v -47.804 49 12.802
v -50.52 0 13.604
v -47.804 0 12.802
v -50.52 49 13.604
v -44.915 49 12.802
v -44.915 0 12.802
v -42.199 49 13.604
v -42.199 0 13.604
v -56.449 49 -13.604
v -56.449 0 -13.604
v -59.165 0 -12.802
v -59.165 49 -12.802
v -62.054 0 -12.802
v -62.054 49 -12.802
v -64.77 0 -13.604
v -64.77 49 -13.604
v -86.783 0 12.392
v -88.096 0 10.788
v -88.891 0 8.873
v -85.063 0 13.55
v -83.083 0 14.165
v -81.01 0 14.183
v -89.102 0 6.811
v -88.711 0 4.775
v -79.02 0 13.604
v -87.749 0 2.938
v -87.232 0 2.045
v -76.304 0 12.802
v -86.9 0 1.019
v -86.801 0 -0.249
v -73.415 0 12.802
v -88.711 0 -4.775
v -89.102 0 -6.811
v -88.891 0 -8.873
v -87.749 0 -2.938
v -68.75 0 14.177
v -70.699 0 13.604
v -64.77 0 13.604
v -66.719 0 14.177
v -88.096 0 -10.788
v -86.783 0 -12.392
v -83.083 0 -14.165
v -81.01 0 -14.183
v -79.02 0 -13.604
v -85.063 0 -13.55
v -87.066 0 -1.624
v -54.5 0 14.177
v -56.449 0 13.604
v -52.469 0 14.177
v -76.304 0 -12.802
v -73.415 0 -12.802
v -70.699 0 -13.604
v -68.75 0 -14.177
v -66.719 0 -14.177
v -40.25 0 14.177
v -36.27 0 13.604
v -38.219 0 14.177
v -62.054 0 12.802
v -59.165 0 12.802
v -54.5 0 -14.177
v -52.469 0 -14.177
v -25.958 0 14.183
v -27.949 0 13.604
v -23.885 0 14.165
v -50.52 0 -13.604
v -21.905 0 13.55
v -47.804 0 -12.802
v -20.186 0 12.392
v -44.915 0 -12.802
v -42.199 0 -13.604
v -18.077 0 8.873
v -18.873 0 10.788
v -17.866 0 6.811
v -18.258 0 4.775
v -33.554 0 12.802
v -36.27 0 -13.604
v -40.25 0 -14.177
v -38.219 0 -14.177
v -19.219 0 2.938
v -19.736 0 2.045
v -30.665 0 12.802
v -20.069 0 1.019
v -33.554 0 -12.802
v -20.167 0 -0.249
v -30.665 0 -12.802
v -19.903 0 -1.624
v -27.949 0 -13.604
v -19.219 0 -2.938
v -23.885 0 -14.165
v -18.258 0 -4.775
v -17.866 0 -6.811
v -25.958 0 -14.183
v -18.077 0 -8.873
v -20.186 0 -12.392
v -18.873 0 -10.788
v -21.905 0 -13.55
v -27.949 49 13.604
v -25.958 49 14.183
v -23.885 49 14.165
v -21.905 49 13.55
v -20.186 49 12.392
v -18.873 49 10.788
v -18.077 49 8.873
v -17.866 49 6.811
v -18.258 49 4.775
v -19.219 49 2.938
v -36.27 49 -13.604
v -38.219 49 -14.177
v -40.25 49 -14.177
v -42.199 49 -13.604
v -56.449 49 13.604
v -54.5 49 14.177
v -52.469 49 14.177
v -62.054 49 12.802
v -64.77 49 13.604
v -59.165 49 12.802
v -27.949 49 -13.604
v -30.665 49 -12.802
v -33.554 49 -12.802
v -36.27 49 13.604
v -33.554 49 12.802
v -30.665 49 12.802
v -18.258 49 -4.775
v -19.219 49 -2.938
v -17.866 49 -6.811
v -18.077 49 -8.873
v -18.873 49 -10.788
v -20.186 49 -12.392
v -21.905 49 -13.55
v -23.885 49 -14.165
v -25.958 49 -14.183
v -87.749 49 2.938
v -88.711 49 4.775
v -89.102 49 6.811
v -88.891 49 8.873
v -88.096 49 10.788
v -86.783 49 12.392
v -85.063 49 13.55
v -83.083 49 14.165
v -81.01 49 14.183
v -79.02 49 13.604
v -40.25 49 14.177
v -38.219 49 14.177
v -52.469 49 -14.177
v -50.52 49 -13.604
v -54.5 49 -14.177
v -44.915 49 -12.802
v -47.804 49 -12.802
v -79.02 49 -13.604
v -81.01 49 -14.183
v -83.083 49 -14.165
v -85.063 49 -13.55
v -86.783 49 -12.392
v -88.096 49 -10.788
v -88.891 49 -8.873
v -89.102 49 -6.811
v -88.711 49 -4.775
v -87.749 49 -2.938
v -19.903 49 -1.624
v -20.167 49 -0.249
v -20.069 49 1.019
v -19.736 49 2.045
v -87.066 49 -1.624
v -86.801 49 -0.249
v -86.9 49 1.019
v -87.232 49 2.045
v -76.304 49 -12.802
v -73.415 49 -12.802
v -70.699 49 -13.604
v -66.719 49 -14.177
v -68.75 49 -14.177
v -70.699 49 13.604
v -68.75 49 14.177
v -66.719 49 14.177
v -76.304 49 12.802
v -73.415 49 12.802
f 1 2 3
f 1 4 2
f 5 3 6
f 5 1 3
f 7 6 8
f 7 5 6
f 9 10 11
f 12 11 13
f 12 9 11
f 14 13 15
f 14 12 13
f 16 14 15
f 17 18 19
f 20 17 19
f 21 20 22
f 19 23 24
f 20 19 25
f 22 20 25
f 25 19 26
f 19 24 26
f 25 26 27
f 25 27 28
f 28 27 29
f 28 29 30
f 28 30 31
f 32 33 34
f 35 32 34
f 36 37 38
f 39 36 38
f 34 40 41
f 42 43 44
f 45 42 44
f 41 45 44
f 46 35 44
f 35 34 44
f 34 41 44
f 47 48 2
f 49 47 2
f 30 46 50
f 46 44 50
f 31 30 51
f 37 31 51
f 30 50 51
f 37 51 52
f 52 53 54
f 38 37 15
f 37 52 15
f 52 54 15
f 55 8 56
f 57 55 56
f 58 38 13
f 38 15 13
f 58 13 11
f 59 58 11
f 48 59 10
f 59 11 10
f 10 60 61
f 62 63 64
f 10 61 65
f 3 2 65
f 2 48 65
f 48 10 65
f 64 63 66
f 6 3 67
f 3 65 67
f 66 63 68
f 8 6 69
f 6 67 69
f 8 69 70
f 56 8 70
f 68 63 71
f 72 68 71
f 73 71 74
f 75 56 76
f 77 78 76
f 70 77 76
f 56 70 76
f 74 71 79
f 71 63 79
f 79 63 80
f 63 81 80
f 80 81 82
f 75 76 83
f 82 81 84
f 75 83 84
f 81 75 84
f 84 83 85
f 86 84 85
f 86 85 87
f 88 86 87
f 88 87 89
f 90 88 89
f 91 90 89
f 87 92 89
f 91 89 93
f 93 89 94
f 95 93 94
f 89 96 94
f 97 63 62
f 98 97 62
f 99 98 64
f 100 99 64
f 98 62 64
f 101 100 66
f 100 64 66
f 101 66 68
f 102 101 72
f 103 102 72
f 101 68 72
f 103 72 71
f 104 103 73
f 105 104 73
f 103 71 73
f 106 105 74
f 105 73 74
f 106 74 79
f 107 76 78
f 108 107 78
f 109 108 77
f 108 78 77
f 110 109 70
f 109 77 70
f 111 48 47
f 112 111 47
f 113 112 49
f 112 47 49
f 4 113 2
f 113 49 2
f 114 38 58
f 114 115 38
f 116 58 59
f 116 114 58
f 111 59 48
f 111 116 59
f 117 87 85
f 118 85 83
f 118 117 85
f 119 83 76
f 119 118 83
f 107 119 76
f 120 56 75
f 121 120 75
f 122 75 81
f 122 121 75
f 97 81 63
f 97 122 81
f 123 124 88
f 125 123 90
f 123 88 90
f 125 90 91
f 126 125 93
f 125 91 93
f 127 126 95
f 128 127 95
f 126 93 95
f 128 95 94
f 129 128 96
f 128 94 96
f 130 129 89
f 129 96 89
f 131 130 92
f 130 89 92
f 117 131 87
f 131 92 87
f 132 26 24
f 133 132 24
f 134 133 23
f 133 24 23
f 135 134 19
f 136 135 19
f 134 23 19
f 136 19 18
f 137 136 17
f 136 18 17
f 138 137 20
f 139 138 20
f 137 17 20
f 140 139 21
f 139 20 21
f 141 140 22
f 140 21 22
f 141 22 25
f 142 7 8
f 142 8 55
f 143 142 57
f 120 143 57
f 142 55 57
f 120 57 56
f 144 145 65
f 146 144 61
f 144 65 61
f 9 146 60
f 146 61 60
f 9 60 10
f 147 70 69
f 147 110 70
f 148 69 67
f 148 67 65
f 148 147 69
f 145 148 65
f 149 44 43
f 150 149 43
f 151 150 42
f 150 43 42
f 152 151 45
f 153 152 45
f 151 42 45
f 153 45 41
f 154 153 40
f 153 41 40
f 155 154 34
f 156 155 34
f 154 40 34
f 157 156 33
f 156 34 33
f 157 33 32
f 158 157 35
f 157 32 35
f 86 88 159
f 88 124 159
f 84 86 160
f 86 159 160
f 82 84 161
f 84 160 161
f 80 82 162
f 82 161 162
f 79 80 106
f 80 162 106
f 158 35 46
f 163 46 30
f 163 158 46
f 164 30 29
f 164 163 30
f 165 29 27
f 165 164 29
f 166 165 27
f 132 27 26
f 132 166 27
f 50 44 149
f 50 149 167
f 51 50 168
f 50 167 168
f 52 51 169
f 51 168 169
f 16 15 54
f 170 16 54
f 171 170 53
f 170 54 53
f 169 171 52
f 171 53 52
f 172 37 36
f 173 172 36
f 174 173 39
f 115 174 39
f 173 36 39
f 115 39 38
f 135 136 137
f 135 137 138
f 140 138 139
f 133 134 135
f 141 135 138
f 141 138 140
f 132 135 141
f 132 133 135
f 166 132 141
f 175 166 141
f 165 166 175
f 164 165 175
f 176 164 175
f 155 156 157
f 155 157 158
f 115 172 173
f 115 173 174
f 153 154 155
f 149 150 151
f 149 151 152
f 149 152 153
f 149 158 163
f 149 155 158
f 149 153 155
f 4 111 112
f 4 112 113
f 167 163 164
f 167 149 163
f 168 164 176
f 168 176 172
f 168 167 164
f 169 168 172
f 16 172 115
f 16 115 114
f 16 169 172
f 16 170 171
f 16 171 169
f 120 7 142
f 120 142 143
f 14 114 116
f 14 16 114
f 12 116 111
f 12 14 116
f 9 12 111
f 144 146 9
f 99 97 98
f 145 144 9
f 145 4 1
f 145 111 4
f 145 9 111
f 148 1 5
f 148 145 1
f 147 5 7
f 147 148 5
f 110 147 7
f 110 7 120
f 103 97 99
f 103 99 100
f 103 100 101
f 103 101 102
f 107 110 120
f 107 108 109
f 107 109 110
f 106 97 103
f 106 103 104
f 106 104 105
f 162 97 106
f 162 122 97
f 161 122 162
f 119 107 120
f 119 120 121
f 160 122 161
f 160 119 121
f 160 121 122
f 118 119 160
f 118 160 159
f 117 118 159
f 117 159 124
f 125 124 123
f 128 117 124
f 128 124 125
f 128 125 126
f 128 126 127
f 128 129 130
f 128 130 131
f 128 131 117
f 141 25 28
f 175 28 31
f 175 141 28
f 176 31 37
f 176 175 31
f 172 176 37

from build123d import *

# Parameters (mm, degrees)
BOSS_EXTRUDE1_DEPTH = 49
FILLET1_R           = 10
FILLET2_R           = 5


with BuildPart() as part:
    # Sketch1 → Boss-Extrude1 (new body)
    with BuildSketch(Plane(origin=(0, 0, 0), x_dir=(1, 0, 0), z_dir=(0, 1, 0))):
        with BuildLine():
            ThreePointArc((-74.859210096, 7.125), (-87.022345912, 12.163135816), (-81.984210096, 0))
            ThreePointArc((-81.984210096, 0), (-87.022345912, -12.163135816), (-74.859210096, -7.125))
            ThreePointArc((-74.859210096, -7.125), (-67.734210096, -14.25), (-60.609210096, -7.125))
            ThreePointArc((-60.609210096, -7.125), (-53.484210096, -14.25), (-46.359210096, -7.125))
            ThreePointArc((-46.359210096, -7.125), (-39.234210096, -14.25), (-32.109210096, -7.125))
            ThreePointArc((-32.109210096, -7.125), (-19.94607428, -12.163135816), (-24.984210096, 0))
            ThreePointArc((-24.984210096, 0), (-19.94607428, 12.163135816), (-32.109210096, 7.125))
            ThreePointArc((-32.109210096, 7.125), (-39.234210096, 14.25), (-46.359210096, 7.125))
            ThreePointArc((-46.359210096, 7.125), (-53.484210096, 14.25), (-60.609210096, 7.125))
            ThreePointArc((-60.609210096, 7.125), (-67.734210096, 14.25), (-74.859210096, 7.125))
        make_face()
    extrude(amount=BOSS_EXTRUDE1_DEPTH)

    # Fillet1
    fillet1_edges = [part.edges().sort_by_distance(p)[0] for p in [
        (-74.859210096, 24.5, -7.125),
        (-60.609210096, 24.5, -7.125),
        (-46.359210096, 24.5, -7.125),
        (-32.109210096, 24.5, -7.125),
        (-32.109210096, 24.5, 7.125),
        (-46.359210096, 24.5, 7.125),
        (-60.609210096, 24.5, 7.125),
        (-74.859210096, 24.5, 7.125),
    ]]
    fillet(fillet1_edges, radius=FILLET1_R)

    # Fillet2
    fillet2_edges = [part.edges().sort_by_distance(p)[0] for p in [
        (-81.984210096, 24.5, 0),
        (-24.984210096, 24.5, 0),
    ]]
    fillet(fillet2_edges, radius=FILLET2_R)


solid = part.part
